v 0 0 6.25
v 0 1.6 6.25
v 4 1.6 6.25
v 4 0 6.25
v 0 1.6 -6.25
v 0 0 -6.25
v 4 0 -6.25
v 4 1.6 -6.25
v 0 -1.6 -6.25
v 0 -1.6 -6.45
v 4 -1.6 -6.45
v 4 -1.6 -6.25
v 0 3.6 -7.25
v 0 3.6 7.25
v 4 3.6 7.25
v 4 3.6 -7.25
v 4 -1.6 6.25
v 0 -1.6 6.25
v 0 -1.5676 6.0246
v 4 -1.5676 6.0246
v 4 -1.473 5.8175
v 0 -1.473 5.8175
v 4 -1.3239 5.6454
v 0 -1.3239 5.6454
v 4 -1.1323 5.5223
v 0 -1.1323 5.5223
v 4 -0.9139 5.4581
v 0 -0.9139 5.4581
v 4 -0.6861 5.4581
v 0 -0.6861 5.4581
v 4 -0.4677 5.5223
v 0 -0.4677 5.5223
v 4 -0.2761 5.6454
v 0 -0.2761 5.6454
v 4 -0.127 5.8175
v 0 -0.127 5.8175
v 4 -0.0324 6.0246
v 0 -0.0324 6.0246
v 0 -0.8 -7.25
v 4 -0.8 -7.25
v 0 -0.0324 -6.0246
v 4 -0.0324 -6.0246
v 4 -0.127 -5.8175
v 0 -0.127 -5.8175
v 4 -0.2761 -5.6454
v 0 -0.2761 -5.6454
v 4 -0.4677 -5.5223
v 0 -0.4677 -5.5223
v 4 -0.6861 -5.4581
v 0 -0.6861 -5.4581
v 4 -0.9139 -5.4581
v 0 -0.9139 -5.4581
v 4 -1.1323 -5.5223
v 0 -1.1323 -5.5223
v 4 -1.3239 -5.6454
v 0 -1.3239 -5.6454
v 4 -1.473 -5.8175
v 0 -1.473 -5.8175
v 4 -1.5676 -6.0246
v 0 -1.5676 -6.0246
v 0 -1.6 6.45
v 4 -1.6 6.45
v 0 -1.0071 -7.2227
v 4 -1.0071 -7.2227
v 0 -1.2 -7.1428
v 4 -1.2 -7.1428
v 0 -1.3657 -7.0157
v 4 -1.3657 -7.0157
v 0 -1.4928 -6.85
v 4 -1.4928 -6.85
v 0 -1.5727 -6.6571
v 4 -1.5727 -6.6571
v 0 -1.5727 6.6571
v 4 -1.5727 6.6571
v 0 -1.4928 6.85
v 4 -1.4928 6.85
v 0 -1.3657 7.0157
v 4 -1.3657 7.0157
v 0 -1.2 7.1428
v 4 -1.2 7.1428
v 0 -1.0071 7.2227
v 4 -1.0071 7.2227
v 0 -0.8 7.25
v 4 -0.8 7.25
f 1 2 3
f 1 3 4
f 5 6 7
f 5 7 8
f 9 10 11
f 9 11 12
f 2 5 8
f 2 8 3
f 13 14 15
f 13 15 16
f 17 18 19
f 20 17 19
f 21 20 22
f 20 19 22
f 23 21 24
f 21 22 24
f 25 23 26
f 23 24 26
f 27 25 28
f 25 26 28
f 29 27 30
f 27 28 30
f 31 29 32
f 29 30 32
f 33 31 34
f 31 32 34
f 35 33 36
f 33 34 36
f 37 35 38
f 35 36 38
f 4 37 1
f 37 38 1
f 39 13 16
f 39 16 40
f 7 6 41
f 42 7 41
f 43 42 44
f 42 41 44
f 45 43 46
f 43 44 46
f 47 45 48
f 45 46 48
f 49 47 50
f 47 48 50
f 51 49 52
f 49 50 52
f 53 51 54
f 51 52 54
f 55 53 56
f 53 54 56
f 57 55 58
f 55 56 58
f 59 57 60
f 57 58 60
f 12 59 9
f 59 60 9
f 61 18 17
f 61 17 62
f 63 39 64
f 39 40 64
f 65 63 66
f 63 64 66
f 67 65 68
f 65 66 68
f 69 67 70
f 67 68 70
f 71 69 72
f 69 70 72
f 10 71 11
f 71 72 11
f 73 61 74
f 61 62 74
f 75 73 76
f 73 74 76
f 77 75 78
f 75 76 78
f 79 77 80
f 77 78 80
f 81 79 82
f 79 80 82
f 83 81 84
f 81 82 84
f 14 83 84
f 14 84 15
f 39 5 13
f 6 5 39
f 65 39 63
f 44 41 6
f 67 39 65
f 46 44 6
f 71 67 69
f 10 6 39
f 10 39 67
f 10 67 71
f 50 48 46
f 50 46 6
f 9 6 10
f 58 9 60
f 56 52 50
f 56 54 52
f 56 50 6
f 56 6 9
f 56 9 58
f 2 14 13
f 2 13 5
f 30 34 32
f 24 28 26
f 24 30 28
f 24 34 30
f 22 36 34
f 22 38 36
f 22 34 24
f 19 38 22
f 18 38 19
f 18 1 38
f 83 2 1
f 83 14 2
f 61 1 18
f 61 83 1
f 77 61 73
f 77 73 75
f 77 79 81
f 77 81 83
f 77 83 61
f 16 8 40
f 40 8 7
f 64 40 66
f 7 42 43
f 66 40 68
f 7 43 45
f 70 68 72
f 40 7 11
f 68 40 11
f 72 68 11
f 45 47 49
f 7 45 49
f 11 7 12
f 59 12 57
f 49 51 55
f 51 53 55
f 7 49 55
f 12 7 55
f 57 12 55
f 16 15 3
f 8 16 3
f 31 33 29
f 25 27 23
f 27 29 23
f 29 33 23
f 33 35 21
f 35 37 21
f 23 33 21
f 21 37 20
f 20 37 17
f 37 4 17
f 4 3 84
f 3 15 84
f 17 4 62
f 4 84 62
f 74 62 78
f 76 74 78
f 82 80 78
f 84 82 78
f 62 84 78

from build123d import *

# Parameters (mm, degrees)
PAD_DEPTH = 4
FILLET_R  = 0.8


with BuildPart() as part:
    # Sketch → Pad (new body)
    with BuildSketch(Plane.YZ):
        with BuildLine():
            Line((1.6, 6.25), (0, 6.25))
            ThreePointArc((-1.6, 6.25), (-0.8, 5.45), (0, 6.25))
            Line((-1.6, 6.25), (-1.6, 7.25))
            Line((-1.6, 7.25), (3.6, 7.25))
            Line((3.6, 7.25), (3.6, -7.25))
            Line((3.6, -7.25), (-1.6, -7.25))
            Line((-1.6, -7.25), (-1.6, -6.25))
            ThreePointArc((0, -6.25), (-0.8, -5.45), (-1.6, -6.25))
            Line((0, -6.25), (1.6, -6.25))
            Line((1.6, -6.25), (1.6, 6.25))
        make_face()
    extrude(amount=PAD_DEPTH)

    # Fillet
    fillet_edges = [part.edges().sort_by_distance(p)[0] for p in [
        (2, -1.6, 7.25),
        (2, -1.6, -7.25),
    ]]
    fillet(fillet_edges, radius=FILLET_R)


solid = part.part
